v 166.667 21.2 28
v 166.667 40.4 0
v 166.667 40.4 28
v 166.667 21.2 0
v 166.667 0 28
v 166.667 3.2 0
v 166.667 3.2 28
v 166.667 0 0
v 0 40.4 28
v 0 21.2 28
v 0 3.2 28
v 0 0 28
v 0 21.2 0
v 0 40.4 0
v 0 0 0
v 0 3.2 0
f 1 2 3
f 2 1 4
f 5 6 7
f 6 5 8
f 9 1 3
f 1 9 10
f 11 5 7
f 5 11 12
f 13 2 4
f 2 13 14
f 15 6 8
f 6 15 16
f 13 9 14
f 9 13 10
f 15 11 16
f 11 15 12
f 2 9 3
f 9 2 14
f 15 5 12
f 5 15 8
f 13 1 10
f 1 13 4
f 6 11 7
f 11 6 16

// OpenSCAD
/*
Top rim rail for Y-direction sides.
Print orientation: print flat on the long rectangular face, open channel upward.
Quantity: three segments per Y side when matching the wall tile columns.
*/

use <../planter_support_free.scad>

export_rim_rail_y();
